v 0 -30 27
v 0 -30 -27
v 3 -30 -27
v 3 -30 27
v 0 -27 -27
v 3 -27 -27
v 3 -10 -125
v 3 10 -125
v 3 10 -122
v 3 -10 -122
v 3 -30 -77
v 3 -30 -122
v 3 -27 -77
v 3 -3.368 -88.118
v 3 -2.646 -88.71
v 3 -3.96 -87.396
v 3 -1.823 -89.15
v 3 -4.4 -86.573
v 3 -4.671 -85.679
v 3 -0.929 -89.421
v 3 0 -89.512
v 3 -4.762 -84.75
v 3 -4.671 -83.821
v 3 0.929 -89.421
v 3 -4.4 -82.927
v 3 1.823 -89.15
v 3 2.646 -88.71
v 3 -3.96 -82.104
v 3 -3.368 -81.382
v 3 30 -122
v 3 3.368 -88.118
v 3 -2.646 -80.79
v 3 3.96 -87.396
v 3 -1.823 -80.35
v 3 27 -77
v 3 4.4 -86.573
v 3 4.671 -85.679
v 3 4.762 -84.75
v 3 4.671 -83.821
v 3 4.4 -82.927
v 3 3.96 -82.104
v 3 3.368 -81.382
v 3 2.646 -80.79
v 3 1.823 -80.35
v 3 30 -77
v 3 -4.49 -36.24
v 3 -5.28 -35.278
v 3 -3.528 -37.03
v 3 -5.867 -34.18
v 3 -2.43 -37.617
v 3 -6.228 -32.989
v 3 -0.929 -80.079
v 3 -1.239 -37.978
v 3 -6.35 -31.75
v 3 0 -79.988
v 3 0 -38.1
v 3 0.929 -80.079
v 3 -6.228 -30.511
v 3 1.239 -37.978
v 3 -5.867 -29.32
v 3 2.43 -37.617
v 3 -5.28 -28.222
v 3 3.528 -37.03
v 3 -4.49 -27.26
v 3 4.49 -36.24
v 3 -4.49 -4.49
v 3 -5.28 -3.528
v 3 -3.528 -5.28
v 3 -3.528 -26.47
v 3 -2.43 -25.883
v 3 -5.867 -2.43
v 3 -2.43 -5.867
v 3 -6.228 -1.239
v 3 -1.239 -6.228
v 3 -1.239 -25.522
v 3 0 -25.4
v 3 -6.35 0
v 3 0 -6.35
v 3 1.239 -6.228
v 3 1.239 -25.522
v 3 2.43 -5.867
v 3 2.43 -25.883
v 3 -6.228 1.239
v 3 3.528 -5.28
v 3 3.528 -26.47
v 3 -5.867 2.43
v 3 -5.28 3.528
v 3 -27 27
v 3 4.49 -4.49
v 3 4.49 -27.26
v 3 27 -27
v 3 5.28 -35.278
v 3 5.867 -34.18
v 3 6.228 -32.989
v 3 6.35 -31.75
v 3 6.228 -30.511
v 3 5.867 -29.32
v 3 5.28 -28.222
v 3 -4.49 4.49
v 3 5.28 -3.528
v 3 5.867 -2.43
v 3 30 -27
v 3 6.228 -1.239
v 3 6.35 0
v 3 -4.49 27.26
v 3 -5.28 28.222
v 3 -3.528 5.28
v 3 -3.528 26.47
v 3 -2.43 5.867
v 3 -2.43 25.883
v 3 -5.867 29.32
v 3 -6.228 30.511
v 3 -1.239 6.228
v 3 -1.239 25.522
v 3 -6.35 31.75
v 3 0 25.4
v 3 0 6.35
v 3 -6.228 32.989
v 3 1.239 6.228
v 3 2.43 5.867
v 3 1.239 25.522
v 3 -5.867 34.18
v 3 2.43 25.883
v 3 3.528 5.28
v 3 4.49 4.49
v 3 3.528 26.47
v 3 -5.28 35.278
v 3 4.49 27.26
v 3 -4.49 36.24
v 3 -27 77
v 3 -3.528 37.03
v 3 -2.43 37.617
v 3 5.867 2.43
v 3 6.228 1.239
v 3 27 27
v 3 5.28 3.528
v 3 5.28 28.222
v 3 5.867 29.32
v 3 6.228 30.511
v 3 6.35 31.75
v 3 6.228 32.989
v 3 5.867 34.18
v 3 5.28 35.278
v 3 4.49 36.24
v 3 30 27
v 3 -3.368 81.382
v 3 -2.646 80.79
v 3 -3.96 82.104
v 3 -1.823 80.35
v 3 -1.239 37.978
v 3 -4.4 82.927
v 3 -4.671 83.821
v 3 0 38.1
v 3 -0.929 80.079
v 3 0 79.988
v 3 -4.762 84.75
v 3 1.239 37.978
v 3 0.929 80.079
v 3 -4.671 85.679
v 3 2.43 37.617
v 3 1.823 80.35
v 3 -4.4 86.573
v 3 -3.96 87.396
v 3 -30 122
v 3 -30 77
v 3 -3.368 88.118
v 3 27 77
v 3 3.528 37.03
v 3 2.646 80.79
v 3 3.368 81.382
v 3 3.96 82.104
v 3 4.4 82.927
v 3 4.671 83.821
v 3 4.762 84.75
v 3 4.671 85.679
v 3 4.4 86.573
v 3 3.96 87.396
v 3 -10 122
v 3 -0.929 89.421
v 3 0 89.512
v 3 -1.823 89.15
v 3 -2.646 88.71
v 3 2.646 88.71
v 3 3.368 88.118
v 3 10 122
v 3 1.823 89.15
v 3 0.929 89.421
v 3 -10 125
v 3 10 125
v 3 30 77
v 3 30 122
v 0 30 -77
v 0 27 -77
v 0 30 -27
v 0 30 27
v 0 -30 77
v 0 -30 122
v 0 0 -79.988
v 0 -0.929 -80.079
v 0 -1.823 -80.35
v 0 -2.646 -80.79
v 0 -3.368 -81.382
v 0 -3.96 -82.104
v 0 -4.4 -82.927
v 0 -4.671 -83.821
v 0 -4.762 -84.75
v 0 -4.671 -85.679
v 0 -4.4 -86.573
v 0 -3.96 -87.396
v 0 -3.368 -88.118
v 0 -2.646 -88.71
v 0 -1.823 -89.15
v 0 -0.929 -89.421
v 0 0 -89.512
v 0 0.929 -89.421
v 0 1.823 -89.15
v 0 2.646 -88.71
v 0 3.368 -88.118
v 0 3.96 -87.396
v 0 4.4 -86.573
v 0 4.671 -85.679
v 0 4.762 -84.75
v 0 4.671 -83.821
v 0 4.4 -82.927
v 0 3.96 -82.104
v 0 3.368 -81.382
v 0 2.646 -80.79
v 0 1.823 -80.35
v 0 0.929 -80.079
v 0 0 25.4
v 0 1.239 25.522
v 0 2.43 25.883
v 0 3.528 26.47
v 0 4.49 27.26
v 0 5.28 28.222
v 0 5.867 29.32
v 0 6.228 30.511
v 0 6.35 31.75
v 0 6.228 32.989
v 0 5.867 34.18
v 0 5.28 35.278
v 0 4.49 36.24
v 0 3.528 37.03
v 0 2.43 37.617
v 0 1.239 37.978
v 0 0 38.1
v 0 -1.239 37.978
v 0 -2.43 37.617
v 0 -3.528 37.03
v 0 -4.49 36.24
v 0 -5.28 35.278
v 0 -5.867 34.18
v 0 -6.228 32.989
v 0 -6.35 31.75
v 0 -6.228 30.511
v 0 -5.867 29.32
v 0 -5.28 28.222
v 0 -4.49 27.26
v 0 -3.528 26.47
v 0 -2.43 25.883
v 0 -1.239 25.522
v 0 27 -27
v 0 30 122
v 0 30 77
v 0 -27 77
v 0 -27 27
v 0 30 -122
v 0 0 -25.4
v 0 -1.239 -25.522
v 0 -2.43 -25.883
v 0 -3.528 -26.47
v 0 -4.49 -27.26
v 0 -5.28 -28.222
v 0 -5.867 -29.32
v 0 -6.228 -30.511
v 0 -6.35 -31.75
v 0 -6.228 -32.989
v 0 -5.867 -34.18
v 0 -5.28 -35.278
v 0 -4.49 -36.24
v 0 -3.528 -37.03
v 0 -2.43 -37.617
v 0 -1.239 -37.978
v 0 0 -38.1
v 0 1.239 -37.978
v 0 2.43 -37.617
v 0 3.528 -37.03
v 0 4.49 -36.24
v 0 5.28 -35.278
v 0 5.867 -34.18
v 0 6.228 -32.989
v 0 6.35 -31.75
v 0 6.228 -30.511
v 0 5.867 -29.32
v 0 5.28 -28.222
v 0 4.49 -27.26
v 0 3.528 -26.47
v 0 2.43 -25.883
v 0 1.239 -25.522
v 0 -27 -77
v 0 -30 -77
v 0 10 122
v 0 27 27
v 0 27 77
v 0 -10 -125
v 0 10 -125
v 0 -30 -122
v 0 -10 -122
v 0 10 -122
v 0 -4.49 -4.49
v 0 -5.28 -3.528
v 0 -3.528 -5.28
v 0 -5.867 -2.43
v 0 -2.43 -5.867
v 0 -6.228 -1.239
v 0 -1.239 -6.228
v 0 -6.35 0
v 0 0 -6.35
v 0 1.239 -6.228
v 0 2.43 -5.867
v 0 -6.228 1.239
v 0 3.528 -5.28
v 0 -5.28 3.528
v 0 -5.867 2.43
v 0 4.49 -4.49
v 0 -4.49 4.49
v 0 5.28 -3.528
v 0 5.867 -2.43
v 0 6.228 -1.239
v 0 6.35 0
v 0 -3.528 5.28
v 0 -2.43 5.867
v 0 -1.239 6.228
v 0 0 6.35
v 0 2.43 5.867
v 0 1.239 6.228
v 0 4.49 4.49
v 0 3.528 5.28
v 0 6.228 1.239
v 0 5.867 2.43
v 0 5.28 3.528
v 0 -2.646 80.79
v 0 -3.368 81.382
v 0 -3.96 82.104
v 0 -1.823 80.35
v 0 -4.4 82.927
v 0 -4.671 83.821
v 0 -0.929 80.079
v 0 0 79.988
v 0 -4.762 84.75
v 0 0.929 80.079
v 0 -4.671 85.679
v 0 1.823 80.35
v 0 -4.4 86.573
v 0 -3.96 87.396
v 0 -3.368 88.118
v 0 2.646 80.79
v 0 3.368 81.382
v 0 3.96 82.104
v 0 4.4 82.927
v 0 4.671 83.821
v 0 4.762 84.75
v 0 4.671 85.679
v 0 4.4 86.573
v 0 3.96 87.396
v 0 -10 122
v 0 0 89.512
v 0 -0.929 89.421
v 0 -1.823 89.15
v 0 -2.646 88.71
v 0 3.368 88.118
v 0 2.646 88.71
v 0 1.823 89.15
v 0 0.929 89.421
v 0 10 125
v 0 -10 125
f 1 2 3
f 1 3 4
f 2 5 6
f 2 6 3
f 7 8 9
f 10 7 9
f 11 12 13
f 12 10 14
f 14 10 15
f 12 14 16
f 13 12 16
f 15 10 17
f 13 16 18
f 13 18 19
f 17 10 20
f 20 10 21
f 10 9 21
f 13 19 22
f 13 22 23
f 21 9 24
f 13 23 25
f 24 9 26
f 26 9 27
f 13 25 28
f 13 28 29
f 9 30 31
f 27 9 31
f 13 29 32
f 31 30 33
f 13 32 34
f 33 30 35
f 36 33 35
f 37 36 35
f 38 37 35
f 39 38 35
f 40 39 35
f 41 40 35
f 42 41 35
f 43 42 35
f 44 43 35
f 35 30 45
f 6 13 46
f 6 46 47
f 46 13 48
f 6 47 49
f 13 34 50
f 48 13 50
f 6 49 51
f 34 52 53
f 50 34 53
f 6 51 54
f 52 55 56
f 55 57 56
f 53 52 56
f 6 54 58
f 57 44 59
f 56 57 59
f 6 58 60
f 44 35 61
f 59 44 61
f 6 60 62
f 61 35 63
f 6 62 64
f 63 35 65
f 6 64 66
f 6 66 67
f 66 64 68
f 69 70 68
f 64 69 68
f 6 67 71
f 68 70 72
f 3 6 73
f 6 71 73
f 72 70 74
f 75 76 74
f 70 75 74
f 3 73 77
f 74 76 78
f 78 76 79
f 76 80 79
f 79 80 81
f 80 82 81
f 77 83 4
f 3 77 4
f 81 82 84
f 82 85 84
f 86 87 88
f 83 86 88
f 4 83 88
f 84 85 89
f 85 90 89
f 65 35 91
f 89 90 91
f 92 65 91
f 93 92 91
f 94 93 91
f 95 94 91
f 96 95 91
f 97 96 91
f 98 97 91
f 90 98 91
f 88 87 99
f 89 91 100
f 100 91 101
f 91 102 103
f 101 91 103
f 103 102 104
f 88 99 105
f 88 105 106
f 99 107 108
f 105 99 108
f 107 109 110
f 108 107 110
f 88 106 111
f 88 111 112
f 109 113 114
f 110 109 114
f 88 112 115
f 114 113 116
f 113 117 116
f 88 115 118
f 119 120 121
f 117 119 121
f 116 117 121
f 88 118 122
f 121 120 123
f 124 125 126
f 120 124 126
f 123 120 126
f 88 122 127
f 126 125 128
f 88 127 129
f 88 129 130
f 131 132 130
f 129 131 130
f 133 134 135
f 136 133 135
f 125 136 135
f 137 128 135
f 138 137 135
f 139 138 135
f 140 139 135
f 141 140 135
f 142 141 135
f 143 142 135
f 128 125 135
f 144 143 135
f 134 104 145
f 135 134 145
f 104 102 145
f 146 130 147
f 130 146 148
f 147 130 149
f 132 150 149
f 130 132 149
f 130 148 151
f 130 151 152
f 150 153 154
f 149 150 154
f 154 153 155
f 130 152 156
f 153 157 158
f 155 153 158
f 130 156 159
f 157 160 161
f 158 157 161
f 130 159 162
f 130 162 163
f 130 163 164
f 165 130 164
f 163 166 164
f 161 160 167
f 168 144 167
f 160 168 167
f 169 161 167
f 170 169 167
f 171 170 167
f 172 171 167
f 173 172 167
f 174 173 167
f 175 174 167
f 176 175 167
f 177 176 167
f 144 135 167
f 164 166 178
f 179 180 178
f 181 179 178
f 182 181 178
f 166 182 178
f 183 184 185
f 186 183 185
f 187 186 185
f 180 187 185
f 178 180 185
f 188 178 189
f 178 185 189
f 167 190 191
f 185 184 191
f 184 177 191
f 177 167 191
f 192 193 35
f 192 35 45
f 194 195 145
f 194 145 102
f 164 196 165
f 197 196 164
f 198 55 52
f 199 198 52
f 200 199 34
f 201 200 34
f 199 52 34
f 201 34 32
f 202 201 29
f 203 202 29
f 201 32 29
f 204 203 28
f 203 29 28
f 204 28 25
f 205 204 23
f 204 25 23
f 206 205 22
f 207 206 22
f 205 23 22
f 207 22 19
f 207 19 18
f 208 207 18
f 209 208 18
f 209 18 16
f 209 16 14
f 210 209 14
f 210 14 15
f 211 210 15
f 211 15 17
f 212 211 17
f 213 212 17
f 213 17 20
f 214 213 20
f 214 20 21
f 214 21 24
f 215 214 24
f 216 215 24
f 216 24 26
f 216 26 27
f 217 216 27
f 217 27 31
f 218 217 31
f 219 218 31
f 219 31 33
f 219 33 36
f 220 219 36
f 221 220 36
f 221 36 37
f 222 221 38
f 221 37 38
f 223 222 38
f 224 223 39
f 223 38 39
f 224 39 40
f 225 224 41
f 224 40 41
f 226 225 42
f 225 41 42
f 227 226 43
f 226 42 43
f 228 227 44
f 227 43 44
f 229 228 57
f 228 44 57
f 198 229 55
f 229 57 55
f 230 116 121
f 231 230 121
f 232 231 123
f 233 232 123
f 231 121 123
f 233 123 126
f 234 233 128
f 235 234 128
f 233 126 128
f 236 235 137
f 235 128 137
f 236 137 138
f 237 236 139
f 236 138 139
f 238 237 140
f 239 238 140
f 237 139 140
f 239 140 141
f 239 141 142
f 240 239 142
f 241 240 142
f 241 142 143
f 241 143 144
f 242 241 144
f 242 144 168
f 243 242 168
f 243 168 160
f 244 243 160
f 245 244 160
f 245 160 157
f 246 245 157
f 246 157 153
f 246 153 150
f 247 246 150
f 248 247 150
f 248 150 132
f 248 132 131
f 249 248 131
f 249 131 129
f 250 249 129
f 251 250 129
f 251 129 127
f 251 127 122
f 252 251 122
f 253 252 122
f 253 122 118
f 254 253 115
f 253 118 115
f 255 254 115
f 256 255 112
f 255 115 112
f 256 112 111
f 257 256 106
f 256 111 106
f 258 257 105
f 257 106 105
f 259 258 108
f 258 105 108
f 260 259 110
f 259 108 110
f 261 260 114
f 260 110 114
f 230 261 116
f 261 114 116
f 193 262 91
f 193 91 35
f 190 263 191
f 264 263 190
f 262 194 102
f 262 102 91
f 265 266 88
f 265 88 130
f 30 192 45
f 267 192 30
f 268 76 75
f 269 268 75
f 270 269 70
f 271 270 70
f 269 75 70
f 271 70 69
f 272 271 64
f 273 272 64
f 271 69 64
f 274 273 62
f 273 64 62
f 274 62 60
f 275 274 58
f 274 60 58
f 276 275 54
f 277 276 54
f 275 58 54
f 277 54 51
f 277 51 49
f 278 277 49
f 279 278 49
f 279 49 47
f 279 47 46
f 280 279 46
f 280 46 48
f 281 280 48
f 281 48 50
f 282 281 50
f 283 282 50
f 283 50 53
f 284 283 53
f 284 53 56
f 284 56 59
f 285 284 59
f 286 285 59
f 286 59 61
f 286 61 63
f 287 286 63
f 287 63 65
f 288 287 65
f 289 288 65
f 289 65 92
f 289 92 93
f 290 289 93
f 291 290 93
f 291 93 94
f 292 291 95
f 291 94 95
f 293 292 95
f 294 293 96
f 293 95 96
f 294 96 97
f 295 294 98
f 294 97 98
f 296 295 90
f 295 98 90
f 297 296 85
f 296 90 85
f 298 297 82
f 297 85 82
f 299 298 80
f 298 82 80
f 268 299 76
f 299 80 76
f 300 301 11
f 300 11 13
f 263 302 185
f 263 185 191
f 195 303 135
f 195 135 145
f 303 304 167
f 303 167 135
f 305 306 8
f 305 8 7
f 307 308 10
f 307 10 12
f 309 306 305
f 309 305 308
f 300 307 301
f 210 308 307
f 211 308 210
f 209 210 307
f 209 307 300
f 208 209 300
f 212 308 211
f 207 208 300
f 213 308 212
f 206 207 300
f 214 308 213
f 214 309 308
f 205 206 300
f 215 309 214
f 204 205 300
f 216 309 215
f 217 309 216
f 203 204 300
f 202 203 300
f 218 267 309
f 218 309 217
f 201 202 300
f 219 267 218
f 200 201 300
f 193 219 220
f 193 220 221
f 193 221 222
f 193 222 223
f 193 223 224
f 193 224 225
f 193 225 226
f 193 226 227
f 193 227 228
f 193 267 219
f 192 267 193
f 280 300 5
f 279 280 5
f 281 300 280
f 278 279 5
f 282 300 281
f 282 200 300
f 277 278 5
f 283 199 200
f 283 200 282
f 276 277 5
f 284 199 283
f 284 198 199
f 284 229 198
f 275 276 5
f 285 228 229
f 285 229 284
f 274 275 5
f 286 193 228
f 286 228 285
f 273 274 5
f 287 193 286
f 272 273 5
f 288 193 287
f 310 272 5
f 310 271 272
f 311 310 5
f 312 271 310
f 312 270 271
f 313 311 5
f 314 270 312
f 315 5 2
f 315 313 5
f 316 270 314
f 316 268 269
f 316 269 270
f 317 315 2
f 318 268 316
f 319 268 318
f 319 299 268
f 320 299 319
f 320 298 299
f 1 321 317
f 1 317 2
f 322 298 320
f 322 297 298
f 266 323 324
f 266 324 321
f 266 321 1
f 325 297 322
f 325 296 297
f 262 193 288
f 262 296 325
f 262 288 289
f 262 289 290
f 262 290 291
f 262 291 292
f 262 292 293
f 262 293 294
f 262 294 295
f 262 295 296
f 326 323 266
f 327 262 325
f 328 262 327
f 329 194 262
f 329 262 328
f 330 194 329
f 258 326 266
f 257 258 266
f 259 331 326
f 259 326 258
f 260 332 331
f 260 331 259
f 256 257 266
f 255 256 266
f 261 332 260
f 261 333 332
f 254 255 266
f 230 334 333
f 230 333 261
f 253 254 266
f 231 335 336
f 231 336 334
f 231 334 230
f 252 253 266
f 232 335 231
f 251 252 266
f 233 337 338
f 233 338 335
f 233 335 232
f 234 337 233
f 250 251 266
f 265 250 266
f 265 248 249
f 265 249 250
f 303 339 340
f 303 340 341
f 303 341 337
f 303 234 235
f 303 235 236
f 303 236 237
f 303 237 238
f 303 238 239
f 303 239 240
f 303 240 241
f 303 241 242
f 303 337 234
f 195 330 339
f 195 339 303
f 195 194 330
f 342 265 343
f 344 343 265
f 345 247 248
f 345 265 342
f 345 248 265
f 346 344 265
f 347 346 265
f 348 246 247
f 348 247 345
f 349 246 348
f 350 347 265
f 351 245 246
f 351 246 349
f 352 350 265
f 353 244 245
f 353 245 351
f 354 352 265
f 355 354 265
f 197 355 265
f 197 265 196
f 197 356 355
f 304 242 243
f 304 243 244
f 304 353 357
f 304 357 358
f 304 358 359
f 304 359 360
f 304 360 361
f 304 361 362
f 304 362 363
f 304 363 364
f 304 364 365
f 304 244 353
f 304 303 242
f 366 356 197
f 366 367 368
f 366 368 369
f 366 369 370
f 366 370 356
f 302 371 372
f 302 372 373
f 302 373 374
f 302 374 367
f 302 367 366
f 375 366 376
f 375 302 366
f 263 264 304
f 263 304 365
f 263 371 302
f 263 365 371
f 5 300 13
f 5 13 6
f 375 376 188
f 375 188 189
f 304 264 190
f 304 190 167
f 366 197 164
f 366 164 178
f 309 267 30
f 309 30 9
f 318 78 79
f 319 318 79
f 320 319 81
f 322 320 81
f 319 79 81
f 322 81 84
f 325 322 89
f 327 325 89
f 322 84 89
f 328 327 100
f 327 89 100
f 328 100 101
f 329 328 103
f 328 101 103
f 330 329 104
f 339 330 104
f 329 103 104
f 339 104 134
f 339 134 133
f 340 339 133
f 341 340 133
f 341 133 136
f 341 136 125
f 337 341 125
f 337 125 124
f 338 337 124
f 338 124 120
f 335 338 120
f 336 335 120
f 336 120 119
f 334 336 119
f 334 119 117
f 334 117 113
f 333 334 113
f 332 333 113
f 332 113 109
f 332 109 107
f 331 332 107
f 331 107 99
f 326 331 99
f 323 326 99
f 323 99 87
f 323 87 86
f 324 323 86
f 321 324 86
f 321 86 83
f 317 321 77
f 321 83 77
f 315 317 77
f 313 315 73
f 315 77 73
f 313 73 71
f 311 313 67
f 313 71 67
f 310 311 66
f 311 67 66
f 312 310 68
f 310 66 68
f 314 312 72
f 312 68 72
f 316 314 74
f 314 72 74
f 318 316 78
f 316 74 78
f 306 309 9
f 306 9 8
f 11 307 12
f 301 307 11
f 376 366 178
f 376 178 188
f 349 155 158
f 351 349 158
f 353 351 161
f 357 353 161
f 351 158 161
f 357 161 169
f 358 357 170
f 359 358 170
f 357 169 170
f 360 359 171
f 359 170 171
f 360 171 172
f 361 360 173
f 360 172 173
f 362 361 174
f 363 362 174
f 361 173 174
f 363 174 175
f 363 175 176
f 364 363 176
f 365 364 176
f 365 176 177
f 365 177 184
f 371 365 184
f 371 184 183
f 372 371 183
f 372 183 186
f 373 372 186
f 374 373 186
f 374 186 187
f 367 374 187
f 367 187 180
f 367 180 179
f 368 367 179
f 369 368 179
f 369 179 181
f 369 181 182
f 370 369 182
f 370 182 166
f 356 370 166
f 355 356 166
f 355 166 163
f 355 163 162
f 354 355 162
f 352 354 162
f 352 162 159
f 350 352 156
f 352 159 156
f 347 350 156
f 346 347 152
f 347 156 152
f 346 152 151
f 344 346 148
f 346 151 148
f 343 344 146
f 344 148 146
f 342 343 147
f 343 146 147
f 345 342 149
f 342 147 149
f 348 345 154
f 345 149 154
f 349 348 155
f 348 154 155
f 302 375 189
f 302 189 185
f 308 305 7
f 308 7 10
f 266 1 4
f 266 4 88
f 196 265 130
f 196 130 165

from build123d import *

# Parameters (mm, degrees)
BOSS_EXTRUDE1_DEPTH = 3
SKETCH2_R           = 6.35
SKETCH2_R_2         = 4.7625
CUT_EXTRUDE1_DEPTH  = 129.5846025


with BuildPart() as part:
    # Sketch1 → Boss-Extrude1 (new body)
    with BuildSketch(Plane(origin=(0, 0, 0), x_dir=(0, 0, -1), z_dir=(1, 0, 0))):
        Polygon((-122, 30), (-77, 30), (-77, 27), (-27, 27), (-27, 30), (27, 30), (27, 27), (77, 27), (77, 30), (122, 30), (122, 10), (125, 10), (125, -10), (122, -10), (122, -30), (77, -30), (77, -27), (27, -27), (27, -30), (-27, -30), (-27, -27), (-77, -27), (-77, -30), (-122, -30), (-122, -10), (-125, -10), (-125, 10), (-122, 10), align=None)
    extrude(amount=BOSS_EXTRUDE1_DEPTH)

    # Sketch2 → Cut-Extrude1 (cut, through all)
    with BuildSketch(Plane(origin=(3, 0, 0), x_dir=(0, 0, -1), z_dir=(1, 0, 0))):
        Circle(SKETCH2_R)
        with Locations((-31.75, 0)):
            Circle(SKETCH2_R)
        with Locations(Location((31.75, 0, 0), (0, 0, 180))):
            Circle(SKETCH2_R)
        with Locations((-84.75, 0)):
            Circle(SKETCH2_R_2)
        with Locations(Location((84.75, 0, 0), (0, 0, 180))):
            Circle(SKETCH2_R_2)
    extrude(amount=-CUT_EXTRUDE1_DEPTH, mode=Mode.SUBTRACT)


solid = part.part
